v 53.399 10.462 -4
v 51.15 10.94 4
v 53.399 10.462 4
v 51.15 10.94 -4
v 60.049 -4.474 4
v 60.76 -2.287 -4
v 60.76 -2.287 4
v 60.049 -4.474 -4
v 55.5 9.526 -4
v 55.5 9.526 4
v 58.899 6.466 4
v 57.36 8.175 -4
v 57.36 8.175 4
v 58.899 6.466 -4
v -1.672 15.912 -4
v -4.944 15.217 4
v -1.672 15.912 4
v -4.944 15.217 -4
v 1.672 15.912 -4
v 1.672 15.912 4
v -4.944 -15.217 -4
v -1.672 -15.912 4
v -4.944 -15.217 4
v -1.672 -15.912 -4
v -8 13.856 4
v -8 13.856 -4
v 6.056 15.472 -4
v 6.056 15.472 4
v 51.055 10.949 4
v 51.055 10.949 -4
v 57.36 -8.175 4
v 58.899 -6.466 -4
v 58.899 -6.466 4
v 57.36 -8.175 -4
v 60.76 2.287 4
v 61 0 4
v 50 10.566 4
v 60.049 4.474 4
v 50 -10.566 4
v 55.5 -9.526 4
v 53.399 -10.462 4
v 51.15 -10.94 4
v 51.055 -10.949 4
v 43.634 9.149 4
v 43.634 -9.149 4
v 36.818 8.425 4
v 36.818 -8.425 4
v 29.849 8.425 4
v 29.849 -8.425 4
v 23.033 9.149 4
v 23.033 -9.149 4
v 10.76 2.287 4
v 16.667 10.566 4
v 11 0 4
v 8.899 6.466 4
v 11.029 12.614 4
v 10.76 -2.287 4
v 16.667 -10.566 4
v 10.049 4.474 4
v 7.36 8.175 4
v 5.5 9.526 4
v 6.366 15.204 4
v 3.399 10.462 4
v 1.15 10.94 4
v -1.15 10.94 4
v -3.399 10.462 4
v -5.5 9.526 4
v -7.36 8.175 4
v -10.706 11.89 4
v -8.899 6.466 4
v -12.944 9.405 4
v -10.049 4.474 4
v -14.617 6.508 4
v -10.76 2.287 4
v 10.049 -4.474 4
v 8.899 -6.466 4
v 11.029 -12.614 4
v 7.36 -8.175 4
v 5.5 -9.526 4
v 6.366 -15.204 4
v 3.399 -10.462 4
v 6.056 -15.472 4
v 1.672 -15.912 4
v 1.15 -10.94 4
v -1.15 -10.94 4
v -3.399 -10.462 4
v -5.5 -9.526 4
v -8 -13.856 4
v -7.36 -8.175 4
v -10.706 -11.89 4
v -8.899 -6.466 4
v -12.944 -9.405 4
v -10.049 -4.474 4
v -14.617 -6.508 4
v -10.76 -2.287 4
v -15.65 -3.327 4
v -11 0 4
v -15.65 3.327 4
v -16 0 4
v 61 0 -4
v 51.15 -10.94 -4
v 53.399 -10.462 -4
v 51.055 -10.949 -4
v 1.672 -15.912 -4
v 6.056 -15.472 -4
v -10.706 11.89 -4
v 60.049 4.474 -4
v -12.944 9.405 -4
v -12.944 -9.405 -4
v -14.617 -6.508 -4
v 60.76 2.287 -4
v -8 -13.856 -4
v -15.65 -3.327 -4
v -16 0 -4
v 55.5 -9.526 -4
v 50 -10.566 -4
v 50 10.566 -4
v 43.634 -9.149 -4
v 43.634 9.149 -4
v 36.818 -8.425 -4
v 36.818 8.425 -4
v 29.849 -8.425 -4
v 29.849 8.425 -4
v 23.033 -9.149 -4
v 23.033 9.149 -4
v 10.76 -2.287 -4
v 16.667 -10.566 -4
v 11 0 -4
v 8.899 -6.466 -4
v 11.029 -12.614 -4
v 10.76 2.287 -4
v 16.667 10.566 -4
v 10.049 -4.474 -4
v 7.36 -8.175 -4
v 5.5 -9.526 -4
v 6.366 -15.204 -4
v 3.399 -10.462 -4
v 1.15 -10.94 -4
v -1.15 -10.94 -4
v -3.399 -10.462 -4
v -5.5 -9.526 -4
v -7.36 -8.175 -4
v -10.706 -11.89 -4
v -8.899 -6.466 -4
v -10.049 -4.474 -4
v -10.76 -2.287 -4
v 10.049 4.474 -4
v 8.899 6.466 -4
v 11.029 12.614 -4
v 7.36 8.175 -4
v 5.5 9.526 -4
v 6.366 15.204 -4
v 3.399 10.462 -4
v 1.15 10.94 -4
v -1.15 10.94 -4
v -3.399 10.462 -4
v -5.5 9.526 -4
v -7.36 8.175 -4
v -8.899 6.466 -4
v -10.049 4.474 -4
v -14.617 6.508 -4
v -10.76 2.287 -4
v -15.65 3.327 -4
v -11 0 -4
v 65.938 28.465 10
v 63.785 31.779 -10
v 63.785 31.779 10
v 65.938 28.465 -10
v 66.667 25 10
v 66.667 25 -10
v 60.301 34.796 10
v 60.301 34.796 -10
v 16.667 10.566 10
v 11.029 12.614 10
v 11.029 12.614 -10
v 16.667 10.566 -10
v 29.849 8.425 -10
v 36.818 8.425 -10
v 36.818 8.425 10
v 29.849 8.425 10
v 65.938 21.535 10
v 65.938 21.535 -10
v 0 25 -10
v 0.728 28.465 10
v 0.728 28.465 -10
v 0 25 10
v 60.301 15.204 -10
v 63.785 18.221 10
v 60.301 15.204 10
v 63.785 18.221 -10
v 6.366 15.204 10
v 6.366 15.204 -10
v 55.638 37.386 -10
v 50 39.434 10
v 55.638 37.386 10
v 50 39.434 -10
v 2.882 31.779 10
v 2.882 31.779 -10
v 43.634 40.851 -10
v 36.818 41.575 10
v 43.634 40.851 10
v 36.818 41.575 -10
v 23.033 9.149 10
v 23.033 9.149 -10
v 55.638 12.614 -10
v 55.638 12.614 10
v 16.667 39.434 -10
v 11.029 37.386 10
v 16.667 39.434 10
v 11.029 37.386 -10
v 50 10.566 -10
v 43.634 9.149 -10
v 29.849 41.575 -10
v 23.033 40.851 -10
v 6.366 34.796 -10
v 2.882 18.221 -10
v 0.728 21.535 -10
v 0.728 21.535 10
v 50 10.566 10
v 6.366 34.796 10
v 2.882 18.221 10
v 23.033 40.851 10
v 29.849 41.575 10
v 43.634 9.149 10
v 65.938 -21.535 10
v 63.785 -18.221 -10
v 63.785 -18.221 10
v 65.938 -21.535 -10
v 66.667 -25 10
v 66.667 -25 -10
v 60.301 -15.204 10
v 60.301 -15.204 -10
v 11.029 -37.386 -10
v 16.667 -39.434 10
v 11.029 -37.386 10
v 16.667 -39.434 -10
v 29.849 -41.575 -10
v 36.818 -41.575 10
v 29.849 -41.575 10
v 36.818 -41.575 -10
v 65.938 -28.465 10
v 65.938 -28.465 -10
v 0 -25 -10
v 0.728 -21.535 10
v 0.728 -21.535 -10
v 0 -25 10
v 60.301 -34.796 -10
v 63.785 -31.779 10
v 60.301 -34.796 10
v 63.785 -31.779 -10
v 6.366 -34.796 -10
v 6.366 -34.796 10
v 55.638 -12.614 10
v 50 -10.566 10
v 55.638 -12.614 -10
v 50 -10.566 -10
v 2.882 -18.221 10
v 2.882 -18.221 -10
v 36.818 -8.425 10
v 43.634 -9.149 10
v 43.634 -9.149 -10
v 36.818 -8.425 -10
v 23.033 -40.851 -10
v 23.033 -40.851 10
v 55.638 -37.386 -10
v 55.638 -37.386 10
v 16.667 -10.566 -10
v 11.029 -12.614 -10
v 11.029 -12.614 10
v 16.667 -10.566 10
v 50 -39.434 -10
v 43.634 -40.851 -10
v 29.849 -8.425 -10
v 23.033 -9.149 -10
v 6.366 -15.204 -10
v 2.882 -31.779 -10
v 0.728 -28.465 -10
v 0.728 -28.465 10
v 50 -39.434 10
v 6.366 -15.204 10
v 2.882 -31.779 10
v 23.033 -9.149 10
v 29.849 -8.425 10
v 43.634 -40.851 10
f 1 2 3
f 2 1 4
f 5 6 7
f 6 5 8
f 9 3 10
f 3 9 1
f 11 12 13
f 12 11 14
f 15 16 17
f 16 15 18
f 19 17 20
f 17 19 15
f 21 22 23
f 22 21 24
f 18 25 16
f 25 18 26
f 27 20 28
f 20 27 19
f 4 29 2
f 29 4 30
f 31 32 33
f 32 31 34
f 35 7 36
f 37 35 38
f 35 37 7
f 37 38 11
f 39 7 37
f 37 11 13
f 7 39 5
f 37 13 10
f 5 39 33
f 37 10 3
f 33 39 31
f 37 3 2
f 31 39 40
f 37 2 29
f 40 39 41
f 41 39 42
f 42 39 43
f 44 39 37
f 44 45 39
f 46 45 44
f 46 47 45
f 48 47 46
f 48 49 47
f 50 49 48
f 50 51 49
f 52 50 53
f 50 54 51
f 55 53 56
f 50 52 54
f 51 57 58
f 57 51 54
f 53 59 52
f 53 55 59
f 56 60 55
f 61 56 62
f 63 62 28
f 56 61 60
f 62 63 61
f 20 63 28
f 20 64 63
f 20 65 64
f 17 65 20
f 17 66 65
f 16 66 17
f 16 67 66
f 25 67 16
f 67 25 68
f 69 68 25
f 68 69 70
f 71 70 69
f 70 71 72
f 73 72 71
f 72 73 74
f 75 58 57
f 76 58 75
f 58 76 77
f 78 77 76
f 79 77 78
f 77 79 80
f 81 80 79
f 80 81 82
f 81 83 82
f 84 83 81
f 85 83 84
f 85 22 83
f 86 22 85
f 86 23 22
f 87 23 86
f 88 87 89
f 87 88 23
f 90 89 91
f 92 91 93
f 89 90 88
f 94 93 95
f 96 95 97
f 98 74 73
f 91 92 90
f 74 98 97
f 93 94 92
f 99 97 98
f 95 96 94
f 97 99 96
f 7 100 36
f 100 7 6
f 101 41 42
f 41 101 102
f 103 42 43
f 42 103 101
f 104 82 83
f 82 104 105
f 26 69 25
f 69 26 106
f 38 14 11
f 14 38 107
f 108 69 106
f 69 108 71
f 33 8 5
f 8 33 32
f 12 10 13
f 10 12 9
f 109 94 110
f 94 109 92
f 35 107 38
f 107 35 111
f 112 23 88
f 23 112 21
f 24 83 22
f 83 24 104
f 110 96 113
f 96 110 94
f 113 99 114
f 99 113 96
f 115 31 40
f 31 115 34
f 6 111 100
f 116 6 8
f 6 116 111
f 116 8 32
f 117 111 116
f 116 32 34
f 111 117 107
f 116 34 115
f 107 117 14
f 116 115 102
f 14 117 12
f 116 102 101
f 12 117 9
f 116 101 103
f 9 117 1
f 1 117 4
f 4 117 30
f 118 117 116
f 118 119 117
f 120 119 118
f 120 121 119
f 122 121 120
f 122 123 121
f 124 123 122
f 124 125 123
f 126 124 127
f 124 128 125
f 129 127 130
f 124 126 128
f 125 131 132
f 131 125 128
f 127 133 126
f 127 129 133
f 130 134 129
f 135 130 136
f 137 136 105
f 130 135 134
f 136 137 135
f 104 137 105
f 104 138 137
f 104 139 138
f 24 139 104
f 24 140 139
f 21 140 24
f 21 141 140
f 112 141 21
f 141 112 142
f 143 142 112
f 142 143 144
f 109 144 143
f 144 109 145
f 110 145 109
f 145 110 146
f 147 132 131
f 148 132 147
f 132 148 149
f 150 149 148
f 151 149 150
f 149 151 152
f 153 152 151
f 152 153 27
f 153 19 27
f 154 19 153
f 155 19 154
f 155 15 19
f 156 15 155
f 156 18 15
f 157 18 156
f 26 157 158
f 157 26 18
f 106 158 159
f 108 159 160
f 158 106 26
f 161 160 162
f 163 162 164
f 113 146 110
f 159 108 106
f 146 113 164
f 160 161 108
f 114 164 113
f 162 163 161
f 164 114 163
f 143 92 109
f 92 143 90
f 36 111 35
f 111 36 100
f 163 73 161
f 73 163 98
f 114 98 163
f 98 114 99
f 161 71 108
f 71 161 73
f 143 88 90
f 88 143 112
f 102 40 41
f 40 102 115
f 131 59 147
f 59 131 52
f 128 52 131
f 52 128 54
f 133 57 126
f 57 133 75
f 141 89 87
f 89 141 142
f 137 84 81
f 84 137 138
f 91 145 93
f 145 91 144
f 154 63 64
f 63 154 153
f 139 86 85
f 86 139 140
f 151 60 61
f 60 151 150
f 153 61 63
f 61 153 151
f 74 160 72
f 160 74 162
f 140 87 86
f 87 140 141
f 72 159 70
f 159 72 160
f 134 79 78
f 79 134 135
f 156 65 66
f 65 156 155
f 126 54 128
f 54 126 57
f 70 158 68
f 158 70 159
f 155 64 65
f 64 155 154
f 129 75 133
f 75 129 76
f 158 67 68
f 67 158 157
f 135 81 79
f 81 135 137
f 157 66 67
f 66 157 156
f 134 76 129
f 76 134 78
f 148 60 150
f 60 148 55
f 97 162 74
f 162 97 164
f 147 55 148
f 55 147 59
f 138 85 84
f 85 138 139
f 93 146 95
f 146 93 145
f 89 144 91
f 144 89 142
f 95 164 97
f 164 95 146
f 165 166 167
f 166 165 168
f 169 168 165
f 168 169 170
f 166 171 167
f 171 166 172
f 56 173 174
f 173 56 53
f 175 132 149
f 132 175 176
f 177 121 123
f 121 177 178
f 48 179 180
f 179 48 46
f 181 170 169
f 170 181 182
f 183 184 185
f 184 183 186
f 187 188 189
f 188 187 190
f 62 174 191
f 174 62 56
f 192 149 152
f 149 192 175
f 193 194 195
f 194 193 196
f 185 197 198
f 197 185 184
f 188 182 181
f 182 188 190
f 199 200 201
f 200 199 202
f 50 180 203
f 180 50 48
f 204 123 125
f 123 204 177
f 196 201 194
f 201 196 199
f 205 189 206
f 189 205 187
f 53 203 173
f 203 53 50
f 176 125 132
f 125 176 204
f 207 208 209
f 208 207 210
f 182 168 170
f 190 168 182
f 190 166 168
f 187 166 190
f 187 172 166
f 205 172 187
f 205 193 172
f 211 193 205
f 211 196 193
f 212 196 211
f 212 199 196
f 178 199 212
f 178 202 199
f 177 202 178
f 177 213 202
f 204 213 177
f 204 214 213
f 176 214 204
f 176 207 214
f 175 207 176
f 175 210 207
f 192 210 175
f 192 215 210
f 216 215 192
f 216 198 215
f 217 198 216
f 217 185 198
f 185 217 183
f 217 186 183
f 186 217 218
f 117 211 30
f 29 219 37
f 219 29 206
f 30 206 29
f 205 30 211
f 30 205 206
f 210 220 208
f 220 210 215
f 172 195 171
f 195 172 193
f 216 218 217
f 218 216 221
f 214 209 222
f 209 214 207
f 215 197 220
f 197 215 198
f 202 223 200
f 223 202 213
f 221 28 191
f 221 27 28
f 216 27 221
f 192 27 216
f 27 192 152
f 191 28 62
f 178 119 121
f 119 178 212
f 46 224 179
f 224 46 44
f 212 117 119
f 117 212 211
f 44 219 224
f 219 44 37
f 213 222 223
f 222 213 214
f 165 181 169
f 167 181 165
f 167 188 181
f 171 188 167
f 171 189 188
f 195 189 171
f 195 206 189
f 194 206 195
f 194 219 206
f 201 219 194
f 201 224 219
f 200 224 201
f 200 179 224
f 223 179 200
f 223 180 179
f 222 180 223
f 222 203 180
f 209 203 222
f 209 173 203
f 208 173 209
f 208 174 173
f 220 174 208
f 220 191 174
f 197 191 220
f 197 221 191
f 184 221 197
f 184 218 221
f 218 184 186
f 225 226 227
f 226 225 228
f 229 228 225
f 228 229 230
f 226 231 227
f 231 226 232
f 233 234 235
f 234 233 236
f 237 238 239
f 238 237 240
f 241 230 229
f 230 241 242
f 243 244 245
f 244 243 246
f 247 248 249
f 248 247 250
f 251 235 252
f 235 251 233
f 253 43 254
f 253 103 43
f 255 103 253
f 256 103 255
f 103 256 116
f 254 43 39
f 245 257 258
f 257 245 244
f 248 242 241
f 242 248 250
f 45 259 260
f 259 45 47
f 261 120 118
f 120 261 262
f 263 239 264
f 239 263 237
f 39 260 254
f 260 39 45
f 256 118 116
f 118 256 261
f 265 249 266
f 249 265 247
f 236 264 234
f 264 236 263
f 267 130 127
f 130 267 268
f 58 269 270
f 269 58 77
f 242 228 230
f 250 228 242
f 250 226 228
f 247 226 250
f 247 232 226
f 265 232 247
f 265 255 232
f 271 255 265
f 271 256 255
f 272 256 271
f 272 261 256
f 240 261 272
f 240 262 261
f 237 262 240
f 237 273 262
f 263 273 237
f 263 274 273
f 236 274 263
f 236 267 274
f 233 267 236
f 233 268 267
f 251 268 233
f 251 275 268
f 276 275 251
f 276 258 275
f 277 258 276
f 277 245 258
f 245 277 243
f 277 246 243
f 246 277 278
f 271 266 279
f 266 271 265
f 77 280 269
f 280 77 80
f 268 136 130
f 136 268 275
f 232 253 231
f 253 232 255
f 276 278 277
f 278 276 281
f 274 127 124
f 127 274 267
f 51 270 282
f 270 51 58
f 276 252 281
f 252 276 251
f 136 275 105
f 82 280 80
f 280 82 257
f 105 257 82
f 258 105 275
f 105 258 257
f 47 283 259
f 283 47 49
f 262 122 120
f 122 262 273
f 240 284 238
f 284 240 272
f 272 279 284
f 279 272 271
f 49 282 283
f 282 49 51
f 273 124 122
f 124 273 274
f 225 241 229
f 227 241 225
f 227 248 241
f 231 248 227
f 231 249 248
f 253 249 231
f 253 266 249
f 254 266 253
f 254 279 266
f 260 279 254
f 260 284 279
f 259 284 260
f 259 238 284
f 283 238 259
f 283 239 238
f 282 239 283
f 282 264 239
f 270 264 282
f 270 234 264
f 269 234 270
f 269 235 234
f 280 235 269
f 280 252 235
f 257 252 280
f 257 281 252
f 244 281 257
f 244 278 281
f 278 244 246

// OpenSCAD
CenterBearingSize=22;
ArmDistance=50;

difference(){
hull(){
cylinder(r=CenterBearingSize/2+5, h=8,center=true);
translate([ArmDistance,0,0])
cylinder(r=CenterBearingSize/2, h=8,center=true);
}
cylinder(r=CenterBearingSize/2, h=11, center=true);
}

scale([2,1,1]){
translate([ArmDistance/3,ArmDistance/2,0])
cylinder(r=ArmDistance/3, h=20, center=true);
translate([ArmDistance/3,-ArmDistance/2,0])
cylinder(r=ArmDistance/3, h=20, center=true);
}
